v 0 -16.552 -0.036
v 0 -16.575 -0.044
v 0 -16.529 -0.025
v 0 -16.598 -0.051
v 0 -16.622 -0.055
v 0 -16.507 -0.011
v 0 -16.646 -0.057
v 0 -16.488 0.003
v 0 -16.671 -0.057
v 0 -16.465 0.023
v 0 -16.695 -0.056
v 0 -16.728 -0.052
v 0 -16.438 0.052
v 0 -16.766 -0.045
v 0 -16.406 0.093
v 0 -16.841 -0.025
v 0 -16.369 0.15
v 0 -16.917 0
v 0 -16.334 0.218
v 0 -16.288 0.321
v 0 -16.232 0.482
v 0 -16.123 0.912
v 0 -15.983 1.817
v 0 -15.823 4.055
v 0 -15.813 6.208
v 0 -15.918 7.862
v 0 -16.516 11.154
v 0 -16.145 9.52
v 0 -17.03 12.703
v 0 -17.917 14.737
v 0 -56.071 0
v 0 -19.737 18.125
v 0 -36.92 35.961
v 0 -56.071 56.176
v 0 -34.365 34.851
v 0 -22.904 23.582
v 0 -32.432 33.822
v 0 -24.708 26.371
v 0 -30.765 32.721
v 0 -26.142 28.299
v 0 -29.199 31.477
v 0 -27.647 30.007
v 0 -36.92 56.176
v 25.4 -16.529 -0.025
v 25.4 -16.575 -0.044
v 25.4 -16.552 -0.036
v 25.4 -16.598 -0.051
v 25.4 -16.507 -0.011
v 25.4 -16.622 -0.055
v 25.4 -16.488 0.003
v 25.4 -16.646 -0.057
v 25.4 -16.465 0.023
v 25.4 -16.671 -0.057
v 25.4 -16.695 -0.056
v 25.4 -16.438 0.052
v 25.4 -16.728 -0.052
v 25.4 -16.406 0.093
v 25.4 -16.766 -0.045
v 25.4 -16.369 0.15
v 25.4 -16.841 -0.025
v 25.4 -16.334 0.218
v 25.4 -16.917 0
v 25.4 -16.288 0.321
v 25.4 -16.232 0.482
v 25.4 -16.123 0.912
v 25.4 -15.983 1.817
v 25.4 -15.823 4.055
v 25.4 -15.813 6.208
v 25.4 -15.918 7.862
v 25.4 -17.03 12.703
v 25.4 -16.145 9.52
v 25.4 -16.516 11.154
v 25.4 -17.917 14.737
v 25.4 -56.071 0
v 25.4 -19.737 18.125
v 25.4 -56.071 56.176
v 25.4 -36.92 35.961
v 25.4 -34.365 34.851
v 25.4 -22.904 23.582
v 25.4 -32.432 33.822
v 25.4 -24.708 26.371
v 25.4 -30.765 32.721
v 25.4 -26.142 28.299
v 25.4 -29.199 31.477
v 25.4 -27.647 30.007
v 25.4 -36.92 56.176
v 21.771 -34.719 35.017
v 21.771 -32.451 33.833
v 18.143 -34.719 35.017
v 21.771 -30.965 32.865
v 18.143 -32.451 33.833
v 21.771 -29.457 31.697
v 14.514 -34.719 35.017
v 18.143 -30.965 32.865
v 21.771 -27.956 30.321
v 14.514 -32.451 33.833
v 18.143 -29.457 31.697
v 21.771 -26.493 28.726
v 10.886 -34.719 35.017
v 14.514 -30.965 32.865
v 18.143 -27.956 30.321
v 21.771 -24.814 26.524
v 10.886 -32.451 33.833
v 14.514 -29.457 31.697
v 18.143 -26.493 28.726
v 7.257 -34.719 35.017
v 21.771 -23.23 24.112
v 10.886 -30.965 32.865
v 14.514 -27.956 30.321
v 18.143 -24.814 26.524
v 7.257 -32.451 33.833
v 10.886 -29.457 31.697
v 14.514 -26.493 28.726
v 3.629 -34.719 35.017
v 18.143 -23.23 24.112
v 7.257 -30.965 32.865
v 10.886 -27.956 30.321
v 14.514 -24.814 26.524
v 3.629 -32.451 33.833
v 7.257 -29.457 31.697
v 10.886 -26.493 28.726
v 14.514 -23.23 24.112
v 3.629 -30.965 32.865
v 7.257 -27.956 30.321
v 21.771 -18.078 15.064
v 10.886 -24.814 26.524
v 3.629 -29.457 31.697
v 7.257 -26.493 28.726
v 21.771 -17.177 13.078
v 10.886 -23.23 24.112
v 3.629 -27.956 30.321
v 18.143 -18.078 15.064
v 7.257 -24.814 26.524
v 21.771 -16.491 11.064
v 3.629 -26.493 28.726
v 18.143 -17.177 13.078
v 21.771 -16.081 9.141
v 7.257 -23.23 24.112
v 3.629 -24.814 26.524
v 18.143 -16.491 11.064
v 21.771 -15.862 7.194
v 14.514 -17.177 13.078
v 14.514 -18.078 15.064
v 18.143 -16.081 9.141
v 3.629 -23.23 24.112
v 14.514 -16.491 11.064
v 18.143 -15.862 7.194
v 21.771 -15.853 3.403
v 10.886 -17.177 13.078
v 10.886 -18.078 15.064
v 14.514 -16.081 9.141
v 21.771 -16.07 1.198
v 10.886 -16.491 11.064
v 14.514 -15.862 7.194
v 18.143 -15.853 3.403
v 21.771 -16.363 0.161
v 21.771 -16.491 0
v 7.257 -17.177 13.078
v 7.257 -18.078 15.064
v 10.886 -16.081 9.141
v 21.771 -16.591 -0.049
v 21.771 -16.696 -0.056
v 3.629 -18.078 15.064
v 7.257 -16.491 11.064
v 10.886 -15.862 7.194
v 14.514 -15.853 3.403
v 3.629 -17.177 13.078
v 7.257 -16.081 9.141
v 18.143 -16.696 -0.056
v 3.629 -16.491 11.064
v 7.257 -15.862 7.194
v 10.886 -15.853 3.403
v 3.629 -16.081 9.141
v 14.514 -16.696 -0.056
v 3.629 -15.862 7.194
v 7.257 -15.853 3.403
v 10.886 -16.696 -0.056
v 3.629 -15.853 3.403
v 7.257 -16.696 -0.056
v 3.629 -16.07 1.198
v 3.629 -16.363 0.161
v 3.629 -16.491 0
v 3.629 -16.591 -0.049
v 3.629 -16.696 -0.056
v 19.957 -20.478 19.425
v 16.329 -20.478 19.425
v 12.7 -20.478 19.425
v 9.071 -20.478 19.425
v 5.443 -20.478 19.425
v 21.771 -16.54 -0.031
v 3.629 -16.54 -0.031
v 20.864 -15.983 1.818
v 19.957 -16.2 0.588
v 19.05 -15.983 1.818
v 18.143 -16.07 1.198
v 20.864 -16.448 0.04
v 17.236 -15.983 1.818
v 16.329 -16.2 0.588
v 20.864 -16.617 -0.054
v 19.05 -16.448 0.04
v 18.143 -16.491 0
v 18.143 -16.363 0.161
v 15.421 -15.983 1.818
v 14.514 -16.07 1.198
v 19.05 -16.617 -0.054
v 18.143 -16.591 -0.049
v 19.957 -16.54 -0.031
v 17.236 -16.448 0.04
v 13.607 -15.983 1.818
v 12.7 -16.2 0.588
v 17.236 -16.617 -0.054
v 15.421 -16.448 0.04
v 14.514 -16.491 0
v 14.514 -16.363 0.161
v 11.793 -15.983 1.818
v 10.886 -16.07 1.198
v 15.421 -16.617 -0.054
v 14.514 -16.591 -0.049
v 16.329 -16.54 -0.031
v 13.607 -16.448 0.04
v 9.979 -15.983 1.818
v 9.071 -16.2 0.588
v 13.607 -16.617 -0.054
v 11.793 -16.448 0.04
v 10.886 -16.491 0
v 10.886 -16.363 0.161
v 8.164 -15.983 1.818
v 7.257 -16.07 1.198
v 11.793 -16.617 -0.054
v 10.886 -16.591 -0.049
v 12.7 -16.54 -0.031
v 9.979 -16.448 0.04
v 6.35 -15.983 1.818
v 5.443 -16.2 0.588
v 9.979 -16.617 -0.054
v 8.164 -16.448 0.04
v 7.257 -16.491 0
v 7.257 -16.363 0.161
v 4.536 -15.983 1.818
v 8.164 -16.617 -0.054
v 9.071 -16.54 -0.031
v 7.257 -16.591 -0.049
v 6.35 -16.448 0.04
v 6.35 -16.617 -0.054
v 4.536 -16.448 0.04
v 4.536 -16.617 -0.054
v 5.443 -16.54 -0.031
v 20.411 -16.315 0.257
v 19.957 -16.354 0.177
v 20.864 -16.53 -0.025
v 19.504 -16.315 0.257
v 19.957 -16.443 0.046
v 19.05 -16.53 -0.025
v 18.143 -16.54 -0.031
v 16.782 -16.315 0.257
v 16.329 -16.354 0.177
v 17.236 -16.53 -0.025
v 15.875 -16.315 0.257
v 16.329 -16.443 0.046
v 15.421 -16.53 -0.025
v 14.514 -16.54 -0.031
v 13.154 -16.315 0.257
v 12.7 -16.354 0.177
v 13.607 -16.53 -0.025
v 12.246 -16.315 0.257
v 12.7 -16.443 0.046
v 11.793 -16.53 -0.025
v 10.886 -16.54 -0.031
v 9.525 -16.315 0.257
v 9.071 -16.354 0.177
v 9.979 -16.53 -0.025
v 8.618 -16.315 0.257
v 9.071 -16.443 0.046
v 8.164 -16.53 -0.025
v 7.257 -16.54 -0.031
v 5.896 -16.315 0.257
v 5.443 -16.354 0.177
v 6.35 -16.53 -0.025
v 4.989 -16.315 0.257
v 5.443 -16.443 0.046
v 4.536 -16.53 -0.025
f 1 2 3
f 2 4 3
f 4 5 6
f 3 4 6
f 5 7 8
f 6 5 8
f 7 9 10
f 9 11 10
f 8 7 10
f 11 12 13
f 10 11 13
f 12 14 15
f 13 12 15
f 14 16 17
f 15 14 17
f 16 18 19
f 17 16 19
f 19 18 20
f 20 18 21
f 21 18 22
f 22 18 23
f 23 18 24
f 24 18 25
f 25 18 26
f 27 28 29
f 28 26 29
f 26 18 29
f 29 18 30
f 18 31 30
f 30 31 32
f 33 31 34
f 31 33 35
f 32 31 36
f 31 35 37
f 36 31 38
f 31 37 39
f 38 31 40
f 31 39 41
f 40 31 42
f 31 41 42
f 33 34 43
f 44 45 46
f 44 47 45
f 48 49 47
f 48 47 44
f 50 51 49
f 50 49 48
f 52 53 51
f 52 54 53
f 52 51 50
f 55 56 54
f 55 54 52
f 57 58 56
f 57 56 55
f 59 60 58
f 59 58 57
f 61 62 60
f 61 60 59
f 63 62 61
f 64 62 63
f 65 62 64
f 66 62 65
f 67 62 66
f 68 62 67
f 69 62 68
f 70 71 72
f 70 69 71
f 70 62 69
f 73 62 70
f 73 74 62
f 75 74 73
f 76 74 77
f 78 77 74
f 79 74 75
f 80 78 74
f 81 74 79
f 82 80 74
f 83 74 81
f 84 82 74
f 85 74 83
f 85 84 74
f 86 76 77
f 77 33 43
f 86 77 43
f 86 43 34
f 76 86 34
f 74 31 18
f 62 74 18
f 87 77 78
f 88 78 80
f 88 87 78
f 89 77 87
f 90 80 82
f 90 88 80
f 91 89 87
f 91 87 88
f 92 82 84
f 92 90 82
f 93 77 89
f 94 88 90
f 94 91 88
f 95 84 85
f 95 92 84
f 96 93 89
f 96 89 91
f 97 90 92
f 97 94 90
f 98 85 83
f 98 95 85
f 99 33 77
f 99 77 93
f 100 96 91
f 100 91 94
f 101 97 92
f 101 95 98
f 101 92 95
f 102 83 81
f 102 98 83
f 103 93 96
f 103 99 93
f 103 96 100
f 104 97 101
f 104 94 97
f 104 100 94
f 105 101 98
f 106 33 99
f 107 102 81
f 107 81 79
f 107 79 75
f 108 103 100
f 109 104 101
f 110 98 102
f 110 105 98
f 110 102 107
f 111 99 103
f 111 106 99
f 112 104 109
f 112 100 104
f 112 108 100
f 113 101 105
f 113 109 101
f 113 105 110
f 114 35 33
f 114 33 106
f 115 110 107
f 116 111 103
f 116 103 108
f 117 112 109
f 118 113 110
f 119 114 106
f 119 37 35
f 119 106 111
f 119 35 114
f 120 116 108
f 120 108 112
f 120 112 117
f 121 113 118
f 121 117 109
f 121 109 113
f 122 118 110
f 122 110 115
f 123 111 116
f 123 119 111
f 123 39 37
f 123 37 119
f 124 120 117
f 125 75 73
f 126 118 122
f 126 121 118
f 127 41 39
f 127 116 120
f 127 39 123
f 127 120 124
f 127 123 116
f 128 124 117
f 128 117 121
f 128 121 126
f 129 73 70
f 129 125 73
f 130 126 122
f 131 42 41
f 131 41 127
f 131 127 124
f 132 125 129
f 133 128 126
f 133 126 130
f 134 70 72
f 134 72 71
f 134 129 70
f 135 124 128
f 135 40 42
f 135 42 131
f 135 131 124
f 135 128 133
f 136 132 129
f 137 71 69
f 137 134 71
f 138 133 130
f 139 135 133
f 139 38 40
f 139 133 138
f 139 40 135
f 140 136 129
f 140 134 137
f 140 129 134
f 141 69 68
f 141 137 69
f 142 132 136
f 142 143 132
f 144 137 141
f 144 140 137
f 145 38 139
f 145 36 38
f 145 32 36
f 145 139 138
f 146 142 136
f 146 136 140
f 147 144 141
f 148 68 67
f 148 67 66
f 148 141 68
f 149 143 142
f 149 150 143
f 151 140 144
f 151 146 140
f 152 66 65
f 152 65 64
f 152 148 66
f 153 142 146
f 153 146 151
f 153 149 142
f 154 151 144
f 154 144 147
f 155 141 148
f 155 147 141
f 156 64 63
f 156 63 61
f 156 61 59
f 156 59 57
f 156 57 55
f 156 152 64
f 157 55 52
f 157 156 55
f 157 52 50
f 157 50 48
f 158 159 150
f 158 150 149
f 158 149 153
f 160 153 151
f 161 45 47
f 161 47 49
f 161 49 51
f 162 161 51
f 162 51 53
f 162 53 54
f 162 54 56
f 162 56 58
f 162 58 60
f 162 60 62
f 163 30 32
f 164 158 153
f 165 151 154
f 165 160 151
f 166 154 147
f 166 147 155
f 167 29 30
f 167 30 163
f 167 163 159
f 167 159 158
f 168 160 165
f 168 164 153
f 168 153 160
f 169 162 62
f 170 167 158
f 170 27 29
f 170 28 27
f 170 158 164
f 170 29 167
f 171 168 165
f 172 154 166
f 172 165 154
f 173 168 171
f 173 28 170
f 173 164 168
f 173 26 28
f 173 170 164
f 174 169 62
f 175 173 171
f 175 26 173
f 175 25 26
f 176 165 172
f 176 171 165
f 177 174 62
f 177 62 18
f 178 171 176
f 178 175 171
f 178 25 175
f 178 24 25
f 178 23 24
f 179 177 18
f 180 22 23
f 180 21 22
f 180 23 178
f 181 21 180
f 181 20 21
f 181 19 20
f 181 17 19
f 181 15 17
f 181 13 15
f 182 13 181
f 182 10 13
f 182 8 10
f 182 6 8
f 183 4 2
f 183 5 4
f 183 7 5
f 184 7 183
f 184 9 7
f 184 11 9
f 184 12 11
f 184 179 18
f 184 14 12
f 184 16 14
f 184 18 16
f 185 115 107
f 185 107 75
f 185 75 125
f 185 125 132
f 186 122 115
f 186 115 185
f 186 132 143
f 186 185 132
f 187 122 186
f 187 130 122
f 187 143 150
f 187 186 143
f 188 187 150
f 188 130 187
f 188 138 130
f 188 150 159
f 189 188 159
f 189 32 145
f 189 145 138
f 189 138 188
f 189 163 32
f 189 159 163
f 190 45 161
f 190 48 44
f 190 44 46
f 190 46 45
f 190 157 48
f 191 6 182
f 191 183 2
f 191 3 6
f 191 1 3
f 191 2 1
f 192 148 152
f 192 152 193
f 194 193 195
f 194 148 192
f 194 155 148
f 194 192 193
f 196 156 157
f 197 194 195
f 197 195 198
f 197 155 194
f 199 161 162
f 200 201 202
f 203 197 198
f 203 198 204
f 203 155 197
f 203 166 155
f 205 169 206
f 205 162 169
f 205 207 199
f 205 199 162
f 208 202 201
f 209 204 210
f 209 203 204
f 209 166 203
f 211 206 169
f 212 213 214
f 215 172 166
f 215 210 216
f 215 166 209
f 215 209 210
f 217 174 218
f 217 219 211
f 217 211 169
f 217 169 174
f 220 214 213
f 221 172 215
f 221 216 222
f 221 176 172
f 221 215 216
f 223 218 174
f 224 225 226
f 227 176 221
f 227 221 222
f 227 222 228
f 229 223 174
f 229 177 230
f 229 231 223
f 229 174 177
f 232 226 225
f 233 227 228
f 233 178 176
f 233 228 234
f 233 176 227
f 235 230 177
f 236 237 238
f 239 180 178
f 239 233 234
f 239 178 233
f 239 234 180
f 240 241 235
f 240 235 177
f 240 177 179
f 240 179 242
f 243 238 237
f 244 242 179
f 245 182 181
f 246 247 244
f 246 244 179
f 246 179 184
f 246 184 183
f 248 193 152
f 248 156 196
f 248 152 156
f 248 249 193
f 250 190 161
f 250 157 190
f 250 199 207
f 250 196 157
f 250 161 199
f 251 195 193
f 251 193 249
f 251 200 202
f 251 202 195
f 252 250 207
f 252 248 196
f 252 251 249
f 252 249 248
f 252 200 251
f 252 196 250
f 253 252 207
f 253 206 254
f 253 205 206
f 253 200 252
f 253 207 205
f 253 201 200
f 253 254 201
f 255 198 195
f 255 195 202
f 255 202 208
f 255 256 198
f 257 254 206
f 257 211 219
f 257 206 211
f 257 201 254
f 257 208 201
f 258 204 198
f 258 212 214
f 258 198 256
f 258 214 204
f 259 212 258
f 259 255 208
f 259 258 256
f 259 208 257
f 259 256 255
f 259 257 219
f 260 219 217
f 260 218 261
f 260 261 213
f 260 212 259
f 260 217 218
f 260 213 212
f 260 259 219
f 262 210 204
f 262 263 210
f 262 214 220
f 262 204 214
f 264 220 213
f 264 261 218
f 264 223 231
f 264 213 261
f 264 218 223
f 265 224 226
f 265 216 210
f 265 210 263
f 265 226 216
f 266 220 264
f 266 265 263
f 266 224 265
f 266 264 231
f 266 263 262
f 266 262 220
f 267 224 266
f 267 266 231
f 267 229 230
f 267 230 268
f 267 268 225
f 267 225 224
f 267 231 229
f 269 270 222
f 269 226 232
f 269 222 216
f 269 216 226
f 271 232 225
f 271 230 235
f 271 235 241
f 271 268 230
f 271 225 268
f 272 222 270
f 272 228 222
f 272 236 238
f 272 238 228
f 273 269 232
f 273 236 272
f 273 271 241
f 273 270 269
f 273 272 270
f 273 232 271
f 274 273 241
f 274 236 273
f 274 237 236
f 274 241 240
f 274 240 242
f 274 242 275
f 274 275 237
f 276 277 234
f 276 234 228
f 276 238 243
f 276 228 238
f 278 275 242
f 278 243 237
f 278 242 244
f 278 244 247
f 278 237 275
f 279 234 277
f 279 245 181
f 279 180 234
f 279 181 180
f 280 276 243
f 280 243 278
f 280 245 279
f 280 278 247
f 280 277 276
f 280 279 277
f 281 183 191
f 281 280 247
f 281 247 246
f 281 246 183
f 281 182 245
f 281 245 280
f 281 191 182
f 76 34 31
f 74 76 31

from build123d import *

# Parameters (mm, degrees)
F1_DEPTH = 25.4


with BuildPart() as f1:
    # F0 (on Right) → F1 (new body)
    with BuildSketch(Plane.YZ):
        with BuildLine():
            Line((-36.9195081294, 56.1760254204), (-56.0708381236, 56.1760254204))
            Line((-56.0708381236, 56.1760254204), (-56.0708381236, 0))
            Line((-56.0708381236, 0), (-16.9170089066, 0))
            add(Edge.make_bspline(
                [(-36.9195081294, 35.9607338905), (-35.4601229338, 35.3580538857), (-32.1631189369, 33.9964953399), (-25.8800850757, 28.9915492914), (-20.347271317, 19.1454647502), (-15.8846570192, 11.4601698018), (-15.6661719788, 4.0056512293), (-16.1933271118, -0.2408932737), (-16.7678721462, -0.0496434244), (-16.9170089066, 0)],
                knots=[0, 0, 0, 0, 0.1333911224, 0.3013536556, 0.5037239231, 0.6830726009, 0.8493105973, 0.9608849994, 1, 1, 1, 1], degree=3))
            Line((-36.9195081294, 35.9607338905), (-36.9195081294, 56.1760254204))
        make_face()
    extrude(amount=F1_DEPTH)


solid = f1.part
